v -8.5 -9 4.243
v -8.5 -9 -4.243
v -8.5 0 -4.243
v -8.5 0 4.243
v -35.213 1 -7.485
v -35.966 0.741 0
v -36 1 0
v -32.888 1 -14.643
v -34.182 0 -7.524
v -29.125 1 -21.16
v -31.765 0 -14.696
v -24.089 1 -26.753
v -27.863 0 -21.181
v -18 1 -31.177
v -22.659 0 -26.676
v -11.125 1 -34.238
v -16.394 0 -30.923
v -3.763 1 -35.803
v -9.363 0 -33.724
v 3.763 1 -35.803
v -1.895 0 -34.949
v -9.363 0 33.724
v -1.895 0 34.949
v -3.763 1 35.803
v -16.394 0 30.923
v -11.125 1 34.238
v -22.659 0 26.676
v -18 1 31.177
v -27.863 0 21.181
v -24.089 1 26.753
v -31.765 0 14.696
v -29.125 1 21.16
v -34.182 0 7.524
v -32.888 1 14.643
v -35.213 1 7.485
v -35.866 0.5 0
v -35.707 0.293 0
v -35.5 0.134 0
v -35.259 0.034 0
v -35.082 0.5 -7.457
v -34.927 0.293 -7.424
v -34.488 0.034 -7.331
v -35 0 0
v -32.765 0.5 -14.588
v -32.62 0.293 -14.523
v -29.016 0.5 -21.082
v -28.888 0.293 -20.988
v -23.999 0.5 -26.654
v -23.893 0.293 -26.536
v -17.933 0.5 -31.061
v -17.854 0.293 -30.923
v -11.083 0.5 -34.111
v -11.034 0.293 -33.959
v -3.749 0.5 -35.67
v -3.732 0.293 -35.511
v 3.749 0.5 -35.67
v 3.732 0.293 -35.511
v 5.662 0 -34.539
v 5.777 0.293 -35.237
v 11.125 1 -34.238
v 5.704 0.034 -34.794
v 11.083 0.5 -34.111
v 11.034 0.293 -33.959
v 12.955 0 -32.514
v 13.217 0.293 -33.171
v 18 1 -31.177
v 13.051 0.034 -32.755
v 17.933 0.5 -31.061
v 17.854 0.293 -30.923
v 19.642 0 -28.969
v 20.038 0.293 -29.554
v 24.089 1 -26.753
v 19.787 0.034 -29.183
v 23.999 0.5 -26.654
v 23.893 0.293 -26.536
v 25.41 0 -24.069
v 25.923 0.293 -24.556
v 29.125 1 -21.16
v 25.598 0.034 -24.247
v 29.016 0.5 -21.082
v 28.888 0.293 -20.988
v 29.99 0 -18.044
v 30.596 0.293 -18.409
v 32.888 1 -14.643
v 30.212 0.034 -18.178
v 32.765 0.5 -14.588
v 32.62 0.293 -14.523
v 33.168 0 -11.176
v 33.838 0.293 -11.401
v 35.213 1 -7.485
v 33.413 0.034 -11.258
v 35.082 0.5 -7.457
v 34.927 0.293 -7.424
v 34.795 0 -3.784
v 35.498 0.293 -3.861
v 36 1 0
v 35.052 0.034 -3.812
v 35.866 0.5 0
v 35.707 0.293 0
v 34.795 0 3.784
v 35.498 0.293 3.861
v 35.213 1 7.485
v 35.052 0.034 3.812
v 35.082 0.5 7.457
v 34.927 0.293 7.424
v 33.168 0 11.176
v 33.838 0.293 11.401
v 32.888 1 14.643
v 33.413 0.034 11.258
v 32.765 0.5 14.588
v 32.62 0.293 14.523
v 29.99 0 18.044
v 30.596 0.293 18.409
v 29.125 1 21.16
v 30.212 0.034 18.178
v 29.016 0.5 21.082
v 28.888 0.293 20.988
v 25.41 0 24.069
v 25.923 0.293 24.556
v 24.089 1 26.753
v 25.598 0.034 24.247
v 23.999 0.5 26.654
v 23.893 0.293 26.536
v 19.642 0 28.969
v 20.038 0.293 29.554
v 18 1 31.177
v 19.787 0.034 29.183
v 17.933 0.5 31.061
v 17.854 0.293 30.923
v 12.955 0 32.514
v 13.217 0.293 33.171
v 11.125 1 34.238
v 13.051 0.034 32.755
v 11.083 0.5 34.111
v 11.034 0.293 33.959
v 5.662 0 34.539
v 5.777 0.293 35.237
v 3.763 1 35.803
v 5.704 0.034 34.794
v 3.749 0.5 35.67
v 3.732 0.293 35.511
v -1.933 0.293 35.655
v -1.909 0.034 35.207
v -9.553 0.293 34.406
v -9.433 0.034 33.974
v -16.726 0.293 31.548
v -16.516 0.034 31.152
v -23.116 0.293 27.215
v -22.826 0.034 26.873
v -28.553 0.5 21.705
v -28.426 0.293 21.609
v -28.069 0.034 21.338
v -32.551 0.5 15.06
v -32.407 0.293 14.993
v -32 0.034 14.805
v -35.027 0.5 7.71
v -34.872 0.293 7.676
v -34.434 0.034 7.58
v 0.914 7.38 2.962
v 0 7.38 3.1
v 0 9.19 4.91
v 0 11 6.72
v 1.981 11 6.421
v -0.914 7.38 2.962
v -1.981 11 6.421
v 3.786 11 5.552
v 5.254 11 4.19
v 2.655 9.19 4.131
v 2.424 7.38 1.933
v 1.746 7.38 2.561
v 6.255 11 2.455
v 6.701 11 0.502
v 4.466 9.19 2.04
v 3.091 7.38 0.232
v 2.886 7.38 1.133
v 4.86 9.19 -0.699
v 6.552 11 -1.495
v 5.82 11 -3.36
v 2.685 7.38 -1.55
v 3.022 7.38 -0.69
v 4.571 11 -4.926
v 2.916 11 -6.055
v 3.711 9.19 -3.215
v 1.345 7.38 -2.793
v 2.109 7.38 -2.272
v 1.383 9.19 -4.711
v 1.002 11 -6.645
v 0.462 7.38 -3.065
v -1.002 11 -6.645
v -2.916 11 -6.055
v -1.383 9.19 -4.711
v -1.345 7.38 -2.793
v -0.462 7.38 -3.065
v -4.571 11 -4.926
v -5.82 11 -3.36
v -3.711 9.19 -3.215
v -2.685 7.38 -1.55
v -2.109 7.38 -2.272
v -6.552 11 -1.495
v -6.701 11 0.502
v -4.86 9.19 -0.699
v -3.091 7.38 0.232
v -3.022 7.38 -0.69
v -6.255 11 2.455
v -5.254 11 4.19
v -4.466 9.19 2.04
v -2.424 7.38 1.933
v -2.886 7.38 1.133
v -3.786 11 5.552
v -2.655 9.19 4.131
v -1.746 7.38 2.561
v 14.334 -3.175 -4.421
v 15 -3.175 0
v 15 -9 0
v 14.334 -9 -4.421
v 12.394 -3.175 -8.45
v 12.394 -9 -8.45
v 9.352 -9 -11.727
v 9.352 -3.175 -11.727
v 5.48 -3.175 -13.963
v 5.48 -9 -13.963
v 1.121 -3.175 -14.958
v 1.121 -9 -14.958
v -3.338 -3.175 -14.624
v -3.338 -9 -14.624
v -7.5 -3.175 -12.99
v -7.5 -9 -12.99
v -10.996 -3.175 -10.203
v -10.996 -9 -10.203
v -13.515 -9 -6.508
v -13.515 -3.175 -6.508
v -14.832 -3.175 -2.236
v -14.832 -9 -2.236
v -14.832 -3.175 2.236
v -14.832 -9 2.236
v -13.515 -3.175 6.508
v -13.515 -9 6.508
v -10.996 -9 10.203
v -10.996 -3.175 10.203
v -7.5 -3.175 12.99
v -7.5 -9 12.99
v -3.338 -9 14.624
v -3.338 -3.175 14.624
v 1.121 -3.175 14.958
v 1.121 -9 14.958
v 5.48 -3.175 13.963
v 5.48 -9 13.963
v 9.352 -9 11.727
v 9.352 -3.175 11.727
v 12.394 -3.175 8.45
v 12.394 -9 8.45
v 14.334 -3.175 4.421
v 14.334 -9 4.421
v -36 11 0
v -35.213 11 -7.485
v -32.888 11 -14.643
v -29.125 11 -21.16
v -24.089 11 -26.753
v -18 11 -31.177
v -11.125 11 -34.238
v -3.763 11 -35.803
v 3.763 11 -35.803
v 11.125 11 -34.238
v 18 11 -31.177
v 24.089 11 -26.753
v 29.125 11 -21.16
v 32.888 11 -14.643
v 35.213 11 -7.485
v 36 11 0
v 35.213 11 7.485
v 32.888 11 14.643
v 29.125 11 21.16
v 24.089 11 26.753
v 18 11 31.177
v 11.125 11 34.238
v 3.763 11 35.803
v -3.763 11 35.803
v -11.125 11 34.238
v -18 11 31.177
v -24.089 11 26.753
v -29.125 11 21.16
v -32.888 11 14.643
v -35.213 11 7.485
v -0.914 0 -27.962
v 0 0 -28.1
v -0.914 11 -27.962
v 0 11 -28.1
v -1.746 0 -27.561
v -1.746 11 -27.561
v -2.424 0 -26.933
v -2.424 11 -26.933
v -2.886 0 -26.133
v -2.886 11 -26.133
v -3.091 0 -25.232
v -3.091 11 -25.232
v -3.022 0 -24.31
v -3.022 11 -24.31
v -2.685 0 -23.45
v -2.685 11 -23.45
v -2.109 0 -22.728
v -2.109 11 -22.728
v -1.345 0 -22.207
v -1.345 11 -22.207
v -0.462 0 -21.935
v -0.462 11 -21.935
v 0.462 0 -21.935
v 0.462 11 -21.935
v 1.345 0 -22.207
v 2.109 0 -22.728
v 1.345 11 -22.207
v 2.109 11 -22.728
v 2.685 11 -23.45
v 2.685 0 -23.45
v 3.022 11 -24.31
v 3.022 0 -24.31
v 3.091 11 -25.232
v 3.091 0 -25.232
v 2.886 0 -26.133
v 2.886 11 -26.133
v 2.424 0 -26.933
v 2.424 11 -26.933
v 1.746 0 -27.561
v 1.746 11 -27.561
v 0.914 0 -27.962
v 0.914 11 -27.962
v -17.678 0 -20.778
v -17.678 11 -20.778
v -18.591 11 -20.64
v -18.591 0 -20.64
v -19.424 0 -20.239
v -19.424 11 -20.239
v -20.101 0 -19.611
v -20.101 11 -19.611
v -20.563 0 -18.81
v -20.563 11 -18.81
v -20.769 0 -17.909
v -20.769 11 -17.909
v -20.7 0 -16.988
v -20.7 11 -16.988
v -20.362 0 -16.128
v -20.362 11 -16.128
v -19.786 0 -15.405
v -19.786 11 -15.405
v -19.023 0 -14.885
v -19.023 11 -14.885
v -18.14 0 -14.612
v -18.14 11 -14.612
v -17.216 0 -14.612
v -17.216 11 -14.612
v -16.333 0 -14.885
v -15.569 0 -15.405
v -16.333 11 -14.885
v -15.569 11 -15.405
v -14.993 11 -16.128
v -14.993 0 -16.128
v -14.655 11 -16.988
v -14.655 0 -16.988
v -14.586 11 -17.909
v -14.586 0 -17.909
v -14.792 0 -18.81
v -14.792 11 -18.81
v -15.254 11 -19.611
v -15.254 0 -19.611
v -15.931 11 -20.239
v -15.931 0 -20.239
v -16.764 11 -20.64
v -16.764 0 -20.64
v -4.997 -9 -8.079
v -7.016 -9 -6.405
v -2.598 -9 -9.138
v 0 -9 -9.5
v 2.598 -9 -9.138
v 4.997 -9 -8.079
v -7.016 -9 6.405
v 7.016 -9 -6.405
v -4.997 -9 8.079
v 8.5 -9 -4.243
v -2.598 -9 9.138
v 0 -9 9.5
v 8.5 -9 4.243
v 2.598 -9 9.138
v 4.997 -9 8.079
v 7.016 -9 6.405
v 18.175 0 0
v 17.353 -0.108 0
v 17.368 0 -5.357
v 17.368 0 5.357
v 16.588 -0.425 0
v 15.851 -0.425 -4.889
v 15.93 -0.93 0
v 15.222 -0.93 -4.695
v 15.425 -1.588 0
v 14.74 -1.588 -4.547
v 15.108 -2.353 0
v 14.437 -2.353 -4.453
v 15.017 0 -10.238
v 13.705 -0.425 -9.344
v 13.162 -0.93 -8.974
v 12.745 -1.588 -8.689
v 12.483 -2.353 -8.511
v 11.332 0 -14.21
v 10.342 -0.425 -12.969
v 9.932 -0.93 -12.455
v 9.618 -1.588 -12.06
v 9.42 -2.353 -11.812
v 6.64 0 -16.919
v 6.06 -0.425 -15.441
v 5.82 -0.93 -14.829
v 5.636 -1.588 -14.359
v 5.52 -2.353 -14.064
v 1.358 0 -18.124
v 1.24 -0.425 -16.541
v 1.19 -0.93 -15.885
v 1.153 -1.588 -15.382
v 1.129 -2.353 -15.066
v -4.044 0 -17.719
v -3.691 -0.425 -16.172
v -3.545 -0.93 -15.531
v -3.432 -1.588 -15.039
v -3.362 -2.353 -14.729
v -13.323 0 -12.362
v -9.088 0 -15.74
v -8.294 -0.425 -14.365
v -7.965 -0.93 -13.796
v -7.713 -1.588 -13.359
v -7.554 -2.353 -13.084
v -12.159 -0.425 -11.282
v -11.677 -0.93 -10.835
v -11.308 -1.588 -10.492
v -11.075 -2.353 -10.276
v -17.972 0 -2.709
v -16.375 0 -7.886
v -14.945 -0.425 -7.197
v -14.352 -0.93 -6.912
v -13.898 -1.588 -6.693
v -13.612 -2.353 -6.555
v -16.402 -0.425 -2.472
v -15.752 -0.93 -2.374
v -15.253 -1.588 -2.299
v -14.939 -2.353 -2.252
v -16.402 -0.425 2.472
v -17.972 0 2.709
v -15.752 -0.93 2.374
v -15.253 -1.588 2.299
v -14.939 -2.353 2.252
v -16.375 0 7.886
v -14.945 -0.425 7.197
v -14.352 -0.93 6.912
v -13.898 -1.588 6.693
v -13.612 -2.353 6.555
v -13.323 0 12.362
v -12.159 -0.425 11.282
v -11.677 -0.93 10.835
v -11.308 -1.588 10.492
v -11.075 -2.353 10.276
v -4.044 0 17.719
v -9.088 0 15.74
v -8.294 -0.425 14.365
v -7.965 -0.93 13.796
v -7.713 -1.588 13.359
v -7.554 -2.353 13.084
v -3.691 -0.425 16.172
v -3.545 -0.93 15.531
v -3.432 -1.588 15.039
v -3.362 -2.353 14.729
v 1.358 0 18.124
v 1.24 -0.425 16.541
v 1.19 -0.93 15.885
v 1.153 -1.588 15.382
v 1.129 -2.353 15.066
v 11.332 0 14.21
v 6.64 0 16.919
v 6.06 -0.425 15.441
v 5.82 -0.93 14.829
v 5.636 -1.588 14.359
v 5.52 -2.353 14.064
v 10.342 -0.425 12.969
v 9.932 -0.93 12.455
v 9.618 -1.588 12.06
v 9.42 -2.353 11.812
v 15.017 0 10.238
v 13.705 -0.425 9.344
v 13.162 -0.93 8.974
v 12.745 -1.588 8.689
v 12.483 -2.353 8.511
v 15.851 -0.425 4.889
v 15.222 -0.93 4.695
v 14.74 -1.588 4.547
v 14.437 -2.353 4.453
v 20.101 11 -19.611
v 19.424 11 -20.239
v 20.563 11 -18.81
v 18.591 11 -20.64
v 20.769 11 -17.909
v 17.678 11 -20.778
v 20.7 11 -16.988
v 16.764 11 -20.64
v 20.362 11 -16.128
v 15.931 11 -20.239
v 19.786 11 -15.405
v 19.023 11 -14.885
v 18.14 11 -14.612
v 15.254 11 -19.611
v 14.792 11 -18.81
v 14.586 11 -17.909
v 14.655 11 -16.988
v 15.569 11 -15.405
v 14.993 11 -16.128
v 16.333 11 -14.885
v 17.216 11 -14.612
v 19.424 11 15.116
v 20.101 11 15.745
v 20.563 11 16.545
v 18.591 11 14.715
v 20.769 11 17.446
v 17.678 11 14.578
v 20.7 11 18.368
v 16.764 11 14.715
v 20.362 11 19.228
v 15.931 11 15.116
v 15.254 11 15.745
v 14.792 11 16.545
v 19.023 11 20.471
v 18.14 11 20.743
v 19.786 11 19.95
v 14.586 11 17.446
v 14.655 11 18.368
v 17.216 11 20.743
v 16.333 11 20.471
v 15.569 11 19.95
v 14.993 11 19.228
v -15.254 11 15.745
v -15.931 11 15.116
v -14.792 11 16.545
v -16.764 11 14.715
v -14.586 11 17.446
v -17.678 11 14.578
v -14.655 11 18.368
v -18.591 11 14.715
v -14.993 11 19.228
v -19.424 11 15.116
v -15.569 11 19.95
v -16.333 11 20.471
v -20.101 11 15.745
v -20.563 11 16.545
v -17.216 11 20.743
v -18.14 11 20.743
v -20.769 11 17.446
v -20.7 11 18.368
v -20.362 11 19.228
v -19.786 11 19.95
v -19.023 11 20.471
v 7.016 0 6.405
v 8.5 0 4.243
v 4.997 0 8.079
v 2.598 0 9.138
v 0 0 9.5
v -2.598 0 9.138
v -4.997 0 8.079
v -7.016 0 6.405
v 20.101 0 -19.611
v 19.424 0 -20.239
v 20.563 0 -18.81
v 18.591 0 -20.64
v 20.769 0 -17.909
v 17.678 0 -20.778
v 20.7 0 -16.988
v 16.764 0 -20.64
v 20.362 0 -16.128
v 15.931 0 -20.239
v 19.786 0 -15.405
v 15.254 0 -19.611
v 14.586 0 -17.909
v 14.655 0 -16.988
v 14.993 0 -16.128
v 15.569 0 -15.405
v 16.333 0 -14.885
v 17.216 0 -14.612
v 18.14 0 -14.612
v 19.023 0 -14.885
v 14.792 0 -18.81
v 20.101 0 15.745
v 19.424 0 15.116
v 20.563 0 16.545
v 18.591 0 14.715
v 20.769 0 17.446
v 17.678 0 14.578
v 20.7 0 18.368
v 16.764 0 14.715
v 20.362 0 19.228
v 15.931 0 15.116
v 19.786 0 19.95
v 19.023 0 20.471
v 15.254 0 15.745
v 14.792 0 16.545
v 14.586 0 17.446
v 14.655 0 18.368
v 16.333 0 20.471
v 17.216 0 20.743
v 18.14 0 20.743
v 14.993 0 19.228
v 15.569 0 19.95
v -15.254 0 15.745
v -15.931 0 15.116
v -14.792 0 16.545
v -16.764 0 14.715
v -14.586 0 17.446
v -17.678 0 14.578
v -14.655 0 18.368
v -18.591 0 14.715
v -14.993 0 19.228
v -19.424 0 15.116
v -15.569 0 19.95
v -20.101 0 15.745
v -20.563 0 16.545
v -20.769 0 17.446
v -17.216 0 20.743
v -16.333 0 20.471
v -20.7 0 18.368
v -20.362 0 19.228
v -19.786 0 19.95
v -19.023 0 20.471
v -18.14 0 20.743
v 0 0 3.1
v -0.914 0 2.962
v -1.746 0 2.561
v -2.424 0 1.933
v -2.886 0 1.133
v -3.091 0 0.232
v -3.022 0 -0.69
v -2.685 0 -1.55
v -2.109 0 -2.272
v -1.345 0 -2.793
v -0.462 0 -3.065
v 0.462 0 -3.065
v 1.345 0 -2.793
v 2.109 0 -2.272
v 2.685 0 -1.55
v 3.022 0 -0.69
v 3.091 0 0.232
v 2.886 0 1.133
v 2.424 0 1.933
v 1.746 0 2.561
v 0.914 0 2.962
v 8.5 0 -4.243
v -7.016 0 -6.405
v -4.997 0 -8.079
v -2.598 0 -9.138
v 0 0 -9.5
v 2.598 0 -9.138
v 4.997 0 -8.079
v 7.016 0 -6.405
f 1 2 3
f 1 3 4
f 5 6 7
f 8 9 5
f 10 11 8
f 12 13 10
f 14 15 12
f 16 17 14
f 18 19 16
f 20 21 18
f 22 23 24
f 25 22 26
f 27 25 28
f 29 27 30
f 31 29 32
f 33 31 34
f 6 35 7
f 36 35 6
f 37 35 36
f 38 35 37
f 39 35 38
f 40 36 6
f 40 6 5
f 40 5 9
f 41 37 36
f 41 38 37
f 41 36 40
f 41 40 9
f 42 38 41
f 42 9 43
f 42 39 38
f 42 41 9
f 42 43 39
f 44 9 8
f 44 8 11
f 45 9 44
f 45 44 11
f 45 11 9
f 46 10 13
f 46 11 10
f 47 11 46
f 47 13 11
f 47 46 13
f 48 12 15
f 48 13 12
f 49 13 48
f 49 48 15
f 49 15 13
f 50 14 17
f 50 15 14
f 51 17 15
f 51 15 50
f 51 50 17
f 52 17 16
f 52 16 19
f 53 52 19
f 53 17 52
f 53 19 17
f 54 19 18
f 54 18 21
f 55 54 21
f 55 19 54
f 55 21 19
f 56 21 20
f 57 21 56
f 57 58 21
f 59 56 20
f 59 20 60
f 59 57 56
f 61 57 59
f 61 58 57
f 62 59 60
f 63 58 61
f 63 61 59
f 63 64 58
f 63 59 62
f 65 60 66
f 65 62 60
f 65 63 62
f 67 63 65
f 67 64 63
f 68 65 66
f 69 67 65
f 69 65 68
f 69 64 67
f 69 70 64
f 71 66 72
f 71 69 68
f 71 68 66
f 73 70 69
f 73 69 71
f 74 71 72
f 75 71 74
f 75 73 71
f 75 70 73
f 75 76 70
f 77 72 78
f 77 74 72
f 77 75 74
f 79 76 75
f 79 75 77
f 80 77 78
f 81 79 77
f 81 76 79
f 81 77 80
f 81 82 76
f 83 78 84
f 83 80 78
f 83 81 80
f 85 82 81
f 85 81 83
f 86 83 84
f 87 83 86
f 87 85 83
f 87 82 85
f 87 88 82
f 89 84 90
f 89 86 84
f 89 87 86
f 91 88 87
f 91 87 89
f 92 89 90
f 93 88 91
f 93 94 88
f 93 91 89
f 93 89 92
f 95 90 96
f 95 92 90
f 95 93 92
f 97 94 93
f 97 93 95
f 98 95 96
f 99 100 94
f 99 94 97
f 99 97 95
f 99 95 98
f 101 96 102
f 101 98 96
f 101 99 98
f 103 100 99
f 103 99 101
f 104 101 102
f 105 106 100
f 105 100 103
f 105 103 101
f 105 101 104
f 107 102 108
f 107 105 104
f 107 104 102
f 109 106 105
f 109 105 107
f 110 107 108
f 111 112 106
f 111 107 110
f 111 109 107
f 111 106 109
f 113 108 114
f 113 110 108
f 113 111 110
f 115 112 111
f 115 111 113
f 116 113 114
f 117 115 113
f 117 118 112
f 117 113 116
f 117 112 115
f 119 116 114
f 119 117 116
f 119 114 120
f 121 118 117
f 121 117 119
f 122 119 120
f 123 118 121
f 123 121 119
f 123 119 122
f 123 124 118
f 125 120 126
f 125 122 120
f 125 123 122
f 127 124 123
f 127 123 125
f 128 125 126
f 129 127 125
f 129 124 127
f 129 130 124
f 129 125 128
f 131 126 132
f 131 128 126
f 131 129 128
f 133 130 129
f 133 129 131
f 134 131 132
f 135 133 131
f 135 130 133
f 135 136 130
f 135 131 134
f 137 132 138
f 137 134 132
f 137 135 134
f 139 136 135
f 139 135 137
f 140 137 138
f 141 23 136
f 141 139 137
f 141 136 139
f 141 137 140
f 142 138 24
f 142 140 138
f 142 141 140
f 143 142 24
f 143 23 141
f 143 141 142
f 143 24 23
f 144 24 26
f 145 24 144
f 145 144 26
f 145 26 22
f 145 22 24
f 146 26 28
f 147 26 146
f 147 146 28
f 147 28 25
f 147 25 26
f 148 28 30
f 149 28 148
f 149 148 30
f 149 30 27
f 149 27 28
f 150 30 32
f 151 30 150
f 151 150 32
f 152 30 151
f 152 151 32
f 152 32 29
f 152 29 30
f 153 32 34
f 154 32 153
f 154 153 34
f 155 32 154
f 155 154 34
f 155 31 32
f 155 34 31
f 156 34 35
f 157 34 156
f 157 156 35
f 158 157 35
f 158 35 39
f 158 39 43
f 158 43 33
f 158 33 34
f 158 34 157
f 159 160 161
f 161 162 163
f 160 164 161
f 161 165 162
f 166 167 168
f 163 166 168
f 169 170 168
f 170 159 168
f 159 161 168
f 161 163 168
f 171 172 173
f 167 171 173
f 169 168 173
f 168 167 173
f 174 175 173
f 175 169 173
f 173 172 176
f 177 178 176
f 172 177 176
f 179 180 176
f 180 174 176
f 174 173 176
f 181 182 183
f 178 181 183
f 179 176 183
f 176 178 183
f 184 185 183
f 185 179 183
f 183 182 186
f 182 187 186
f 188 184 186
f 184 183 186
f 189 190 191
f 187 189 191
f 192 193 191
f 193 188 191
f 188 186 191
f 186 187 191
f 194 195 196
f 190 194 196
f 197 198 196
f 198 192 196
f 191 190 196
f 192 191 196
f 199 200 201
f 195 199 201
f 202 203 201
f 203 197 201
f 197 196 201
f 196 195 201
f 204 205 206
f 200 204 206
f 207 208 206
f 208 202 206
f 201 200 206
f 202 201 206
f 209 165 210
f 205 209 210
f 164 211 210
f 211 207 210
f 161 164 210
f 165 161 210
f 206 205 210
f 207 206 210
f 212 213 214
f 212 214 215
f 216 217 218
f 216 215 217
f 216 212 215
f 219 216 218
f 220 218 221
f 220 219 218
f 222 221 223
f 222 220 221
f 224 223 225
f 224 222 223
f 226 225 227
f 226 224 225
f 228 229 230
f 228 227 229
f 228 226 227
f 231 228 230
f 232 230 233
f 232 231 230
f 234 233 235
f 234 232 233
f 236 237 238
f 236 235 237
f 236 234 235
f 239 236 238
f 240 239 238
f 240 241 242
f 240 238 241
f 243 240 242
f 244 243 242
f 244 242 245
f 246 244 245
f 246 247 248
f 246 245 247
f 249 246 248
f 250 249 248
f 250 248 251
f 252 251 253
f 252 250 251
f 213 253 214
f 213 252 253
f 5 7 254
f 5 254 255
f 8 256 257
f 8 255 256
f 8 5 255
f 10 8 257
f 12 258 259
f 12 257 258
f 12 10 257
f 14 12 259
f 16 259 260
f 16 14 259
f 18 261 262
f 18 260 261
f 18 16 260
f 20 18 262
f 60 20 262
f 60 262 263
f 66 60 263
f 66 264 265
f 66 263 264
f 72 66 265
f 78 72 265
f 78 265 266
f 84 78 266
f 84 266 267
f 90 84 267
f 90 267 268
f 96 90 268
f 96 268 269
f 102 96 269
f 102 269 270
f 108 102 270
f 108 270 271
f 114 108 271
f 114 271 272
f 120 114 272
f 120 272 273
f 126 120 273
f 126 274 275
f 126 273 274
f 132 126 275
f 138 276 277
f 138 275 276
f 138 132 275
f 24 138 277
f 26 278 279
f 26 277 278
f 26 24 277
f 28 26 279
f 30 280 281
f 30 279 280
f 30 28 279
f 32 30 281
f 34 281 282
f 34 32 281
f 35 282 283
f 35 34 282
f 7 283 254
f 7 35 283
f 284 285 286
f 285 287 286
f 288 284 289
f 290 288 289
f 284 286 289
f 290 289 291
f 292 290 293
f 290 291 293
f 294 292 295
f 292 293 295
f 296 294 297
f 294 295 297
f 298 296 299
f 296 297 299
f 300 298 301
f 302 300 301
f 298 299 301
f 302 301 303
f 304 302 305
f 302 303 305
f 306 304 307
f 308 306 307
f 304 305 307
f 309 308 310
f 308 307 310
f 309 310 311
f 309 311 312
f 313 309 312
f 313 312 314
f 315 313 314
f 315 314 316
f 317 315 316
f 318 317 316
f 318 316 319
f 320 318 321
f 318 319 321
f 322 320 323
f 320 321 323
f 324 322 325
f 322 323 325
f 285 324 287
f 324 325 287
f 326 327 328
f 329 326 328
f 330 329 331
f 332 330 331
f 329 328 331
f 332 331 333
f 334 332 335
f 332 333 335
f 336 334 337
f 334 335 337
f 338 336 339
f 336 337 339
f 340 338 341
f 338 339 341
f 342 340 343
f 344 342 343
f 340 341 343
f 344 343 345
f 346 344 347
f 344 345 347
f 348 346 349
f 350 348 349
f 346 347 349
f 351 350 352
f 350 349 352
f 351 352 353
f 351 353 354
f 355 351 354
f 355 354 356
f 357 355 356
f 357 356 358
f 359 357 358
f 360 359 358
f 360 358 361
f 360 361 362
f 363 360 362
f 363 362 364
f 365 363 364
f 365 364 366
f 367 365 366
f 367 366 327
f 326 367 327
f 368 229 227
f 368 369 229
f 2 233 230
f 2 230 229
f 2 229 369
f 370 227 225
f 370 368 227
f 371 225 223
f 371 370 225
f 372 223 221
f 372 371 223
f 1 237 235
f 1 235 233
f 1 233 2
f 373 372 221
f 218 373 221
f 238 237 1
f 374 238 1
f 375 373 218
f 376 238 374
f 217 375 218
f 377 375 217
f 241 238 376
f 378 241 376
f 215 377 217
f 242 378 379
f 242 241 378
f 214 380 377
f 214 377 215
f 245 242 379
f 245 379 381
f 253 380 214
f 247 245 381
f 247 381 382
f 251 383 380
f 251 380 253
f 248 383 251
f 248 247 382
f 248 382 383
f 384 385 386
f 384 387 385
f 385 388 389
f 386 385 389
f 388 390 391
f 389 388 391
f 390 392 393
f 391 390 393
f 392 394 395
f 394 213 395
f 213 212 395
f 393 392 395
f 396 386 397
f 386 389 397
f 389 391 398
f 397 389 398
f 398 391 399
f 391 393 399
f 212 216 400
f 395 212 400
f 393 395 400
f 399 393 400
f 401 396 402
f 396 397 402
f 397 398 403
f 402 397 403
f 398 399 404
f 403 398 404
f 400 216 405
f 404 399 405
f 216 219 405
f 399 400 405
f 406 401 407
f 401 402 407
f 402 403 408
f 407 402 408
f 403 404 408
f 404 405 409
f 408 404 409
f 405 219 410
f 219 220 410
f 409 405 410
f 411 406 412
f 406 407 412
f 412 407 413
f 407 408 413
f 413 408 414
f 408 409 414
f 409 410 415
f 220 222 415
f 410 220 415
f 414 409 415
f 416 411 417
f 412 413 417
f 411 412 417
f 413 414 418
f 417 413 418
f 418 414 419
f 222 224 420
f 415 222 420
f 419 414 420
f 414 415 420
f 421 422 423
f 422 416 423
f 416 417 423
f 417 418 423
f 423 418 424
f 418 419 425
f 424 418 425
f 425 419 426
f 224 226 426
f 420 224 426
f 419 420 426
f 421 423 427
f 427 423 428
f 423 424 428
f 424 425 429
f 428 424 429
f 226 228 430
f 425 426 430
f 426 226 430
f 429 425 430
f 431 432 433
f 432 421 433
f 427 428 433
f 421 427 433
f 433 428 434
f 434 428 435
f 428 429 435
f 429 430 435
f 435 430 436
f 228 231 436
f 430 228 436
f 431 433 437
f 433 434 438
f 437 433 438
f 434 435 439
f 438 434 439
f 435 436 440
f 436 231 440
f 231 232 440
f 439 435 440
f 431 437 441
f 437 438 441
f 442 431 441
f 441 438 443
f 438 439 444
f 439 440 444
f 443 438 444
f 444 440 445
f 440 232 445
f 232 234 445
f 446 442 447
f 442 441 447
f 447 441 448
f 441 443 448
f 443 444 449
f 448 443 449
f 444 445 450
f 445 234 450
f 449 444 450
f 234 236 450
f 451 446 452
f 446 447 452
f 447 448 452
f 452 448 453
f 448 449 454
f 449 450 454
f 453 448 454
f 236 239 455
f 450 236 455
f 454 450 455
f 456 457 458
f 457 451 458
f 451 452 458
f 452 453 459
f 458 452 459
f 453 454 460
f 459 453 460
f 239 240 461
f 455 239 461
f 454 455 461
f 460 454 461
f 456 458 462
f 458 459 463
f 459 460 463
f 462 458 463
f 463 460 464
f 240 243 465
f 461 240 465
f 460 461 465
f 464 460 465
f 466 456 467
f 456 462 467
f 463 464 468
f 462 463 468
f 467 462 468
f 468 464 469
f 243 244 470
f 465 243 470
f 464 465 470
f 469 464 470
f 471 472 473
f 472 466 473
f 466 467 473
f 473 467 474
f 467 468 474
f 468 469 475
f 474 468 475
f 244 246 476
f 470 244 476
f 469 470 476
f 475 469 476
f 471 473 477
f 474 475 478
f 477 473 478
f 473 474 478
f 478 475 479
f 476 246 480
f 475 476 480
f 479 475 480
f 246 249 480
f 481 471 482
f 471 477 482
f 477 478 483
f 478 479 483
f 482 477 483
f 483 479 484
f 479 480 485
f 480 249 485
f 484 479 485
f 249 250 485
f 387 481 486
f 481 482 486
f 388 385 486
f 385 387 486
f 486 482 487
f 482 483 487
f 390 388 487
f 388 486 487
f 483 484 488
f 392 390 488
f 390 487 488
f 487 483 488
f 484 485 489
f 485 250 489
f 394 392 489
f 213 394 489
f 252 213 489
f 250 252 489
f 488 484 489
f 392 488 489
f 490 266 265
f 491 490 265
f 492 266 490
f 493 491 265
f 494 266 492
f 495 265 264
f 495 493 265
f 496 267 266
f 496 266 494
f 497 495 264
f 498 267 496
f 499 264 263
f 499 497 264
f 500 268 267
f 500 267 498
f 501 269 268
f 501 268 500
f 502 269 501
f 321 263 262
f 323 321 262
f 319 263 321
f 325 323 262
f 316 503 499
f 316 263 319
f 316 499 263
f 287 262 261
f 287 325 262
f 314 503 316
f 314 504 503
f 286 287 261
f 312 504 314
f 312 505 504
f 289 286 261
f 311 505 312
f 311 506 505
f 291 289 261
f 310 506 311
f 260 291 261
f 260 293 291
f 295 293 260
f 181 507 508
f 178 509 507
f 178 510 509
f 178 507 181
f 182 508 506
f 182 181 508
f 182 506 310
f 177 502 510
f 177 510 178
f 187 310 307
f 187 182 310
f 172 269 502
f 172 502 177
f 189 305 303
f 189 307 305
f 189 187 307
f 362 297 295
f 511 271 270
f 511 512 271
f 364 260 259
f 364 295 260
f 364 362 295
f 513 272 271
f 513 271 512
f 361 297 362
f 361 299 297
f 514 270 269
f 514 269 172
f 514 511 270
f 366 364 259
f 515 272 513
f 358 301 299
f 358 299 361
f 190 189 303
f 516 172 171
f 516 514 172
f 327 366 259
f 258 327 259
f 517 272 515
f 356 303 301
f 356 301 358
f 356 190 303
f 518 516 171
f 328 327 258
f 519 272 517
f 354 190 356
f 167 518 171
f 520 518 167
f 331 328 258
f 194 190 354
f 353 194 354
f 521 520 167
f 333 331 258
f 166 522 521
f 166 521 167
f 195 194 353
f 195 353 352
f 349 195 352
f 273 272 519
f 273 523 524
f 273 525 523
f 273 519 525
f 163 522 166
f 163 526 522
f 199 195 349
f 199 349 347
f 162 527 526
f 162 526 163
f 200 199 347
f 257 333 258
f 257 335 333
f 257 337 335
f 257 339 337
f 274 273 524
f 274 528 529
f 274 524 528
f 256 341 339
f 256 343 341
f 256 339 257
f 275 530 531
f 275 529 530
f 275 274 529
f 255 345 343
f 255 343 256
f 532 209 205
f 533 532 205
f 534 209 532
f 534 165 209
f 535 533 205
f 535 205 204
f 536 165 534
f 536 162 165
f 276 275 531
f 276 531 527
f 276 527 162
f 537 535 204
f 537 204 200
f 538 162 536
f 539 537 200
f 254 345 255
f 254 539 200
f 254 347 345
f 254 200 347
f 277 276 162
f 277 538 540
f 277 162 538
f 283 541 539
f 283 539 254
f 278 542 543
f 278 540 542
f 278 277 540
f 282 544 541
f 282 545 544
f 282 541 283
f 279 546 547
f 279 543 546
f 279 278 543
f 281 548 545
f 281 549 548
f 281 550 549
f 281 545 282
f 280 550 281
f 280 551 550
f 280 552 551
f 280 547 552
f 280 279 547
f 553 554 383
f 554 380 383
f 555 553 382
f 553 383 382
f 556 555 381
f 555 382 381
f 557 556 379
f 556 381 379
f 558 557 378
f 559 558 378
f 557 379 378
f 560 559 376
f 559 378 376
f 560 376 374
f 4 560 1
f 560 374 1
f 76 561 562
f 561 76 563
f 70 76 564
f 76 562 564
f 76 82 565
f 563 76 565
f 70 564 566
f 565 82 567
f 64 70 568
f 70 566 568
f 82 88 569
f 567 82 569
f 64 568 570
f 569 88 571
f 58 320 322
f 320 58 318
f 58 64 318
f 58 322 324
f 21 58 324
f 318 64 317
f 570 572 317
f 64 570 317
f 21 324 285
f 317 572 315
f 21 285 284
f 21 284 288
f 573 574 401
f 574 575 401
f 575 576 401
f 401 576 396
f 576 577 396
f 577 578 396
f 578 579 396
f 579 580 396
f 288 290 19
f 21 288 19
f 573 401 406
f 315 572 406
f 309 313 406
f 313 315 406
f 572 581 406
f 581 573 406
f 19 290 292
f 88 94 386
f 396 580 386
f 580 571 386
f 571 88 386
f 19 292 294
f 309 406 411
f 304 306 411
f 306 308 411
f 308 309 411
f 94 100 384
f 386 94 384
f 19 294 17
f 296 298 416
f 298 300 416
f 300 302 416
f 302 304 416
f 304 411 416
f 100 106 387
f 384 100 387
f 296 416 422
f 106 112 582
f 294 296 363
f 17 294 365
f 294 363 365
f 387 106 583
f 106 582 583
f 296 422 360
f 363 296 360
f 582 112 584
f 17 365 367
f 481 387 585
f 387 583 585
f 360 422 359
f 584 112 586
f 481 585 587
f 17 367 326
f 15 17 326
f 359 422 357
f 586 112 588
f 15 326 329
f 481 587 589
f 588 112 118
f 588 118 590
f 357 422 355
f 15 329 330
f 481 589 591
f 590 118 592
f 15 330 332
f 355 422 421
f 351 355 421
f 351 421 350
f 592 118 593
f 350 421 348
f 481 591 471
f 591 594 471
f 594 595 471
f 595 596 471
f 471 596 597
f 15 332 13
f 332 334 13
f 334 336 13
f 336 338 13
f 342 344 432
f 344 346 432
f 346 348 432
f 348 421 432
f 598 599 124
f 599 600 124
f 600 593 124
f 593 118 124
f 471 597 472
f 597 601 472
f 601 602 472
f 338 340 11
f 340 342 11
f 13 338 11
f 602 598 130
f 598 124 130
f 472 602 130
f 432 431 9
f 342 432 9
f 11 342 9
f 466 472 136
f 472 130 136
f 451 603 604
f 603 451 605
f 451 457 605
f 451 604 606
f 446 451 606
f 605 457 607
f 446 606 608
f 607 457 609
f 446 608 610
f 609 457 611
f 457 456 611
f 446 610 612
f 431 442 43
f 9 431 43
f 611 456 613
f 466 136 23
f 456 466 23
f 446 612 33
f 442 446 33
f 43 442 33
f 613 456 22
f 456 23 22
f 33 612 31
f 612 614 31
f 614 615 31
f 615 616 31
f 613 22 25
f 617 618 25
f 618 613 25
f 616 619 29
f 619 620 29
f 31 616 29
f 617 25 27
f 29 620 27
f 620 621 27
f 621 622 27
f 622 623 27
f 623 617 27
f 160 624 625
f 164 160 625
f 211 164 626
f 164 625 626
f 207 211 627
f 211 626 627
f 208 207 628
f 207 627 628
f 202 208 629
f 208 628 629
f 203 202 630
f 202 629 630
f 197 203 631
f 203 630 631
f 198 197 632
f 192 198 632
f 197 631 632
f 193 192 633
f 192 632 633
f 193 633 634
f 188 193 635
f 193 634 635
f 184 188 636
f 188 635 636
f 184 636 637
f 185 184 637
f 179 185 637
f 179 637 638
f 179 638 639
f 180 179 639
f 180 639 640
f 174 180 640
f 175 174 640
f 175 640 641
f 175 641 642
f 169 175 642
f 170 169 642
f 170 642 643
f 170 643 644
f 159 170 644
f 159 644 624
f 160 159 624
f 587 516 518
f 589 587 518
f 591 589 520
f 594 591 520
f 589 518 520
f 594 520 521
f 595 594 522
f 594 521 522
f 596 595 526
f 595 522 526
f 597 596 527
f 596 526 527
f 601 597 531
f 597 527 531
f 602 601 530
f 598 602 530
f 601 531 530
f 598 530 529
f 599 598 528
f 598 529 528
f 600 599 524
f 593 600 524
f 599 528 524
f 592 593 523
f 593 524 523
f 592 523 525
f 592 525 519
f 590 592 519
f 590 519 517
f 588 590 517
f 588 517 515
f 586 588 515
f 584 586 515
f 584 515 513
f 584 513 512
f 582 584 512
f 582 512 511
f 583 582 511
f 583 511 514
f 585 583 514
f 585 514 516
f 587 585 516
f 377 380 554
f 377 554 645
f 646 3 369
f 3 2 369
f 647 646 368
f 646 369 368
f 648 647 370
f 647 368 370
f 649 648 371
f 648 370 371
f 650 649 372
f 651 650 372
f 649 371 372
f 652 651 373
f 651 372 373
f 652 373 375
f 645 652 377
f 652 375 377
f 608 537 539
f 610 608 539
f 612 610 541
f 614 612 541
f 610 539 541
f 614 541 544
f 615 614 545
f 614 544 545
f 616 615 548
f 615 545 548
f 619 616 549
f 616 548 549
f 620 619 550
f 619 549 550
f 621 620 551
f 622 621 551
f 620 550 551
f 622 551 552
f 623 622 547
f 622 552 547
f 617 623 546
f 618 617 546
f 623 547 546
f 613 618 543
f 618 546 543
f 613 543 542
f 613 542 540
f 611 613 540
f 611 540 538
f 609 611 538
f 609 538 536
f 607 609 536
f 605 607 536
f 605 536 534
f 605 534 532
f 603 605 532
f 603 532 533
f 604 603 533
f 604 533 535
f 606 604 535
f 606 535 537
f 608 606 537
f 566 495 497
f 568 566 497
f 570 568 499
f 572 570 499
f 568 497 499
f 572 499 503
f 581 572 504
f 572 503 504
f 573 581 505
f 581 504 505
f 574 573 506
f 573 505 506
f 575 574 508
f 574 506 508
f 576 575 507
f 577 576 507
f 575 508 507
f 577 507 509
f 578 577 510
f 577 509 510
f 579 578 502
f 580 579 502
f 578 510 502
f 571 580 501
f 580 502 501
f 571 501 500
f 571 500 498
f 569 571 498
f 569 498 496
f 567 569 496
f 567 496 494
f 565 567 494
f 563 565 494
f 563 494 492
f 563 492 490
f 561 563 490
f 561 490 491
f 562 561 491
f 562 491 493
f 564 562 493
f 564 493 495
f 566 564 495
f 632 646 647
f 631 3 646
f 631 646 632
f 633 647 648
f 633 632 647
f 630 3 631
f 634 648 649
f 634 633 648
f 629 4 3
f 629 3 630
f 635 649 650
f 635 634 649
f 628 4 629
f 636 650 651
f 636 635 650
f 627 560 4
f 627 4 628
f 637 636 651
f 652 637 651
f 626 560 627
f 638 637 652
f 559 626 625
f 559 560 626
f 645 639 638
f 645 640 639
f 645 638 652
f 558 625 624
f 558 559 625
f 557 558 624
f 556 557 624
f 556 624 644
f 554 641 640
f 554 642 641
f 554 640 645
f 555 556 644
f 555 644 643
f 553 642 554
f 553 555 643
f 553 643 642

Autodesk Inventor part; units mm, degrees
ref_plane "YZ Plane" through (0, 0, 0) normal (1, 0, 0) x (0, 1, 0)
ref_plane "XZ Plane" through (0, 0, 0) normal (0, 1, 0) x (-1, 0, 0)
ref_plane "XY Plane" through (0, 0, 0) normal (0, 0, 1) x (1, 0, 0)
sketch "Sketch1" plane through (0, 0, 0) normal (0, 1, 0) x (-1, 0, 0)
  circle A0 centre (0, 0) radius 36
  dimension "d0" = 72
extrude "Extrusion1" add sketch "Sketch1" along normal blind 11
sketch "Sketch2" plane through (0, 0, 0) normal (0, -1, 0) x (1, 0, 0)
  line L0 (0, -58.3451) -> (0, 0) construction
  line L1 (0, 0) -> (-17.6777, -17.6777) construction
  point P0 (0, -25)
  point P1 (17.6777, -17.6777)
  point P2 (17.6777, 17.6777)
  point P3 (-17.6777, 17.6777)
  dimension "d84" = 45
  dimension "d85" = 25
  dimension "d86" = 25
  dimension "d89" = 360
fillet "Fillet2" radius 1 1 edges at (36, 0, 0)
sketch "Sketch10" plane through (0, 0, 0) normal (0, -1, 0) x (1, 0, 0)
  circle A0 centre (0, 0) radius 15
  dimension "d66" = 30
extrude "Extrusion6" add sketch "Sketch10" along normal blind 9
fillet "Fillet4" radius 3.175 1 edges at (-15, 0, 0)
sketch "Sketch11" plane through (0, -9, 0) normal (0, -1, 0) x (1, 0, 0)
  line L0 (-8.5, -4.2426) -> (-8.5, 4.2426)
  line L1 (8.5, 4.2426) -> (8.5, -4.2426)
  arc A0 (-8.5, -4.2426) -> (8.5, -4.2426) centre (0, 0) ccw
  arc A1 (8.5, 4.2426) -> (-8.5, 4.2426) centre (0, 0) ccw
  dimension "d71" = 17
  dimension "d72" = 8.5
  dimension "d73" = 9.5
  dimension "d74" = 9.5
extrude "Extrusion7" cut sketch "Sketch11" against normal blind 9
sketch "Sketch12" plane through (0, 11, 0) normal (0, 1, 0) x (1, 0, 0)
  point P0 (0, 0)
  point P1 (0, 0)
hole "Hole5" at (0, 11, 0) direction (0, -1, 0) diameter 6.2 end through all countersink diameter 13.44 countersink angle 90
hole "Hole6" at (-17.6777, 0, -17.6777) at (0, 0, -25) at (17.6777, 0, -17.6777) at (17.6777, 0, 17.6777) at (-17.6777, 0, 17.6777) direction (0, 1, 0) diameter 6.2 end through all
equation "\"d72\" = 0.5 * d71"
properties part number "baseplate" material "PBT Plastic"
